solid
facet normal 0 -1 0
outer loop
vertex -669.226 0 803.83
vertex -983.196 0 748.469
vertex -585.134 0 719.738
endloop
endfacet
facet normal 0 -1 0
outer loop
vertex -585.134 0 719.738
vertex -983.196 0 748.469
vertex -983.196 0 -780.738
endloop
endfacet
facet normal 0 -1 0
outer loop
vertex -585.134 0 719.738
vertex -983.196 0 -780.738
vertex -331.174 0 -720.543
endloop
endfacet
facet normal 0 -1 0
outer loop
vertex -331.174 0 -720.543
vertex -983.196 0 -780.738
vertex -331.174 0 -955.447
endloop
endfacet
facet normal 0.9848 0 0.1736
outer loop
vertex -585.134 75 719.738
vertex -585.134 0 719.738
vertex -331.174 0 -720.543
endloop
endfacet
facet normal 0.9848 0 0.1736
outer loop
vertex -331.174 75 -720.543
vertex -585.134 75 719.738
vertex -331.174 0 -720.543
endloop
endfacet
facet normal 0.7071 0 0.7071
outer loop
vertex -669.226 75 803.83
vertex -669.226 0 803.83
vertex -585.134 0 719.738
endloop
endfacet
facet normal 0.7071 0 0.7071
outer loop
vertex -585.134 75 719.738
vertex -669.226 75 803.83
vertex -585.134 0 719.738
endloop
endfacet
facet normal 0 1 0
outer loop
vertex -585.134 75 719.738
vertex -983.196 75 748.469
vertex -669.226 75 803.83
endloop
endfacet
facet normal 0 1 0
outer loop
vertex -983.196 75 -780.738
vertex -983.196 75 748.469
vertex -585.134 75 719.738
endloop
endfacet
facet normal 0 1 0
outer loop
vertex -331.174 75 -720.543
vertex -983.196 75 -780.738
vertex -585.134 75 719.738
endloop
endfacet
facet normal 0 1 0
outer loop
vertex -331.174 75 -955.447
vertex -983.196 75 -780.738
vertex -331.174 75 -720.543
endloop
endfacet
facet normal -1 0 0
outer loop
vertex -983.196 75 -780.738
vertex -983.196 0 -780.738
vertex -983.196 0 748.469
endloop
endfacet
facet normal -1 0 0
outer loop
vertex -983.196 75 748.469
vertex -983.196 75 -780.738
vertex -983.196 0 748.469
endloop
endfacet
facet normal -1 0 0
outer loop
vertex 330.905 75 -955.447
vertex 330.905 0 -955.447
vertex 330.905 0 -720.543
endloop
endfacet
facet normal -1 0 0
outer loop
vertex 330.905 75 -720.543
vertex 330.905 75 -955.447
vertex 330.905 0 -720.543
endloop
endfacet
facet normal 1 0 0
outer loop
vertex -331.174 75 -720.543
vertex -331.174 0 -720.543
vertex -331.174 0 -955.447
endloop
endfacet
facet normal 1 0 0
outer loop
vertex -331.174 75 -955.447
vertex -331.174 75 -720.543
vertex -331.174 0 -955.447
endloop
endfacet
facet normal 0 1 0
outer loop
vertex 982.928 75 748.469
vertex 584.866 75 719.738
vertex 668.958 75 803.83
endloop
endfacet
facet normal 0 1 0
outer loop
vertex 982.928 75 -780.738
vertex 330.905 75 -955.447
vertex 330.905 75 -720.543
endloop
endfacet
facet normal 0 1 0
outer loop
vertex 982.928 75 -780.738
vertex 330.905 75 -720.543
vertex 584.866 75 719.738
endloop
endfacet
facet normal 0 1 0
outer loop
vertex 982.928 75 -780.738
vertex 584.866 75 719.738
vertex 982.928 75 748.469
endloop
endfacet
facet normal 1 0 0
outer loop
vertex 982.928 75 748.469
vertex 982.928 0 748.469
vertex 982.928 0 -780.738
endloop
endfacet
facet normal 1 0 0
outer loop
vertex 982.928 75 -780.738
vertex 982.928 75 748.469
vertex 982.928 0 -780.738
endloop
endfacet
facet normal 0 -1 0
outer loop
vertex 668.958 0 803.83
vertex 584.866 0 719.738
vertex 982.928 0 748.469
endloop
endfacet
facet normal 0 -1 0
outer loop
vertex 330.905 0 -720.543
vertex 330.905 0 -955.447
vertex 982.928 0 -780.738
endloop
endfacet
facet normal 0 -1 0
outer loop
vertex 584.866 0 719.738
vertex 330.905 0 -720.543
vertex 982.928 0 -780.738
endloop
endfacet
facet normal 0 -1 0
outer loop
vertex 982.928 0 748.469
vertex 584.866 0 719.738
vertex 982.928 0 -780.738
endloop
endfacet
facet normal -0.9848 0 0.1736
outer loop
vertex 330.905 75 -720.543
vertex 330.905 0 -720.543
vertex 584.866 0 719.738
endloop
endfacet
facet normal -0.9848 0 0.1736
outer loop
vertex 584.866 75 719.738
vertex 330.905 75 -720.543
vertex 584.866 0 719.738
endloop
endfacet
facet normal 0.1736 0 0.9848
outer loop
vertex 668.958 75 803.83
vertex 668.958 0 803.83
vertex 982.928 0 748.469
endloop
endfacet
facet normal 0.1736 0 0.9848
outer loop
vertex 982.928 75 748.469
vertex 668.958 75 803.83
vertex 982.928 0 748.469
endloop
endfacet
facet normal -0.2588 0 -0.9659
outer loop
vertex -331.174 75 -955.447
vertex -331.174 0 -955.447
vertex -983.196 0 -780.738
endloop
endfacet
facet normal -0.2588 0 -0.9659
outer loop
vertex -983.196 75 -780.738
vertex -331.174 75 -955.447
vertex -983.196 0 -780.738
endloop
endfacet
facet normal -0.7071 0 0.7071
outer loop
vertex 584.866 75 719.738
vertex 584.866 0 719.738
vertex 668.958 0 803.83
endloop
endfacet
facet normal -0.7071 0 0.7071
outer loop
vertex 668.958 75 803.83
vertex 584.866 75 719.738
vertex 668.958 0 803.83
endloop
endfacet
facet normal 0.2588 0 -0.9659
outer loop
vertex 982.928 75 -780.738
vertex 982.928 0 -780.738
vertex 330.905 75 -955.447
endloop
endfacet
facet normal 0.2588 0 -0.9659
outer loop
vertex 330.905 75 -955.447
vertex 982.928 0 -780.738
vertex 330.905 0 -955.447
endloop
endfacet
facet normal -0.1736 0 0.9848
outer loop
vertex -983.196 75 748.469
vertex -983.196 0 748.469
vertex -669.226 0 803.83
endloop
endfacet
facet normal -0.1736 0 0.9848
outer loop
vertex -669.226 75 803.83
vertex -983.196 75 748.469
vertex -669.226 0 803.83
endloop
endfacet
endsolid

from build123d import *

# Parameters (mm, degrees)
BOSS_EXTRUDE1_DEPTH   = 75
BOSS_EXTRUDE1_2_DEPTH = 75


with BuildPart() as part:
    # Sketch2 → Boss-Extrude1 (new body)
    with BuildSketch(Plane(origin=(0, 0, 0), x_dir=(1, 0, 0), z_dir=(0, 1, 0))):
        Polygon((584.865866398, -719.738268583), (668.957787666, -803.830189852), (982.928076995, -748.468756703), (982.928076995, 780.737776155), (330.90540656, 955.446724145), (330.90540656, 720.543070197), align=None)
    extrude(amount=BOSS_EXTRUDE1_DEPTH)


with BuildPart() as body_2:
    # Sketch2 → Boss-Extrude1 2 (new body)
    with BuildSketch(Plane(origin=(0, 0, 0), x_dir=(1, 0, 0), z_dir=(0, 1, 0))):
        Polygon((-331.173673764, 720.543070197), (-331.173673764, 955.446724145), (-983.196344199, 780.737776155), (-983.196344199, -748.468756703), (-669.226054871, -803.830189852), (-585.134133602, -719.738268583), align=None)
    extrude(amount=BOSS_EXTRUDE1_2_DEPTH)


solid = Compound([part.part, body_2.part])
